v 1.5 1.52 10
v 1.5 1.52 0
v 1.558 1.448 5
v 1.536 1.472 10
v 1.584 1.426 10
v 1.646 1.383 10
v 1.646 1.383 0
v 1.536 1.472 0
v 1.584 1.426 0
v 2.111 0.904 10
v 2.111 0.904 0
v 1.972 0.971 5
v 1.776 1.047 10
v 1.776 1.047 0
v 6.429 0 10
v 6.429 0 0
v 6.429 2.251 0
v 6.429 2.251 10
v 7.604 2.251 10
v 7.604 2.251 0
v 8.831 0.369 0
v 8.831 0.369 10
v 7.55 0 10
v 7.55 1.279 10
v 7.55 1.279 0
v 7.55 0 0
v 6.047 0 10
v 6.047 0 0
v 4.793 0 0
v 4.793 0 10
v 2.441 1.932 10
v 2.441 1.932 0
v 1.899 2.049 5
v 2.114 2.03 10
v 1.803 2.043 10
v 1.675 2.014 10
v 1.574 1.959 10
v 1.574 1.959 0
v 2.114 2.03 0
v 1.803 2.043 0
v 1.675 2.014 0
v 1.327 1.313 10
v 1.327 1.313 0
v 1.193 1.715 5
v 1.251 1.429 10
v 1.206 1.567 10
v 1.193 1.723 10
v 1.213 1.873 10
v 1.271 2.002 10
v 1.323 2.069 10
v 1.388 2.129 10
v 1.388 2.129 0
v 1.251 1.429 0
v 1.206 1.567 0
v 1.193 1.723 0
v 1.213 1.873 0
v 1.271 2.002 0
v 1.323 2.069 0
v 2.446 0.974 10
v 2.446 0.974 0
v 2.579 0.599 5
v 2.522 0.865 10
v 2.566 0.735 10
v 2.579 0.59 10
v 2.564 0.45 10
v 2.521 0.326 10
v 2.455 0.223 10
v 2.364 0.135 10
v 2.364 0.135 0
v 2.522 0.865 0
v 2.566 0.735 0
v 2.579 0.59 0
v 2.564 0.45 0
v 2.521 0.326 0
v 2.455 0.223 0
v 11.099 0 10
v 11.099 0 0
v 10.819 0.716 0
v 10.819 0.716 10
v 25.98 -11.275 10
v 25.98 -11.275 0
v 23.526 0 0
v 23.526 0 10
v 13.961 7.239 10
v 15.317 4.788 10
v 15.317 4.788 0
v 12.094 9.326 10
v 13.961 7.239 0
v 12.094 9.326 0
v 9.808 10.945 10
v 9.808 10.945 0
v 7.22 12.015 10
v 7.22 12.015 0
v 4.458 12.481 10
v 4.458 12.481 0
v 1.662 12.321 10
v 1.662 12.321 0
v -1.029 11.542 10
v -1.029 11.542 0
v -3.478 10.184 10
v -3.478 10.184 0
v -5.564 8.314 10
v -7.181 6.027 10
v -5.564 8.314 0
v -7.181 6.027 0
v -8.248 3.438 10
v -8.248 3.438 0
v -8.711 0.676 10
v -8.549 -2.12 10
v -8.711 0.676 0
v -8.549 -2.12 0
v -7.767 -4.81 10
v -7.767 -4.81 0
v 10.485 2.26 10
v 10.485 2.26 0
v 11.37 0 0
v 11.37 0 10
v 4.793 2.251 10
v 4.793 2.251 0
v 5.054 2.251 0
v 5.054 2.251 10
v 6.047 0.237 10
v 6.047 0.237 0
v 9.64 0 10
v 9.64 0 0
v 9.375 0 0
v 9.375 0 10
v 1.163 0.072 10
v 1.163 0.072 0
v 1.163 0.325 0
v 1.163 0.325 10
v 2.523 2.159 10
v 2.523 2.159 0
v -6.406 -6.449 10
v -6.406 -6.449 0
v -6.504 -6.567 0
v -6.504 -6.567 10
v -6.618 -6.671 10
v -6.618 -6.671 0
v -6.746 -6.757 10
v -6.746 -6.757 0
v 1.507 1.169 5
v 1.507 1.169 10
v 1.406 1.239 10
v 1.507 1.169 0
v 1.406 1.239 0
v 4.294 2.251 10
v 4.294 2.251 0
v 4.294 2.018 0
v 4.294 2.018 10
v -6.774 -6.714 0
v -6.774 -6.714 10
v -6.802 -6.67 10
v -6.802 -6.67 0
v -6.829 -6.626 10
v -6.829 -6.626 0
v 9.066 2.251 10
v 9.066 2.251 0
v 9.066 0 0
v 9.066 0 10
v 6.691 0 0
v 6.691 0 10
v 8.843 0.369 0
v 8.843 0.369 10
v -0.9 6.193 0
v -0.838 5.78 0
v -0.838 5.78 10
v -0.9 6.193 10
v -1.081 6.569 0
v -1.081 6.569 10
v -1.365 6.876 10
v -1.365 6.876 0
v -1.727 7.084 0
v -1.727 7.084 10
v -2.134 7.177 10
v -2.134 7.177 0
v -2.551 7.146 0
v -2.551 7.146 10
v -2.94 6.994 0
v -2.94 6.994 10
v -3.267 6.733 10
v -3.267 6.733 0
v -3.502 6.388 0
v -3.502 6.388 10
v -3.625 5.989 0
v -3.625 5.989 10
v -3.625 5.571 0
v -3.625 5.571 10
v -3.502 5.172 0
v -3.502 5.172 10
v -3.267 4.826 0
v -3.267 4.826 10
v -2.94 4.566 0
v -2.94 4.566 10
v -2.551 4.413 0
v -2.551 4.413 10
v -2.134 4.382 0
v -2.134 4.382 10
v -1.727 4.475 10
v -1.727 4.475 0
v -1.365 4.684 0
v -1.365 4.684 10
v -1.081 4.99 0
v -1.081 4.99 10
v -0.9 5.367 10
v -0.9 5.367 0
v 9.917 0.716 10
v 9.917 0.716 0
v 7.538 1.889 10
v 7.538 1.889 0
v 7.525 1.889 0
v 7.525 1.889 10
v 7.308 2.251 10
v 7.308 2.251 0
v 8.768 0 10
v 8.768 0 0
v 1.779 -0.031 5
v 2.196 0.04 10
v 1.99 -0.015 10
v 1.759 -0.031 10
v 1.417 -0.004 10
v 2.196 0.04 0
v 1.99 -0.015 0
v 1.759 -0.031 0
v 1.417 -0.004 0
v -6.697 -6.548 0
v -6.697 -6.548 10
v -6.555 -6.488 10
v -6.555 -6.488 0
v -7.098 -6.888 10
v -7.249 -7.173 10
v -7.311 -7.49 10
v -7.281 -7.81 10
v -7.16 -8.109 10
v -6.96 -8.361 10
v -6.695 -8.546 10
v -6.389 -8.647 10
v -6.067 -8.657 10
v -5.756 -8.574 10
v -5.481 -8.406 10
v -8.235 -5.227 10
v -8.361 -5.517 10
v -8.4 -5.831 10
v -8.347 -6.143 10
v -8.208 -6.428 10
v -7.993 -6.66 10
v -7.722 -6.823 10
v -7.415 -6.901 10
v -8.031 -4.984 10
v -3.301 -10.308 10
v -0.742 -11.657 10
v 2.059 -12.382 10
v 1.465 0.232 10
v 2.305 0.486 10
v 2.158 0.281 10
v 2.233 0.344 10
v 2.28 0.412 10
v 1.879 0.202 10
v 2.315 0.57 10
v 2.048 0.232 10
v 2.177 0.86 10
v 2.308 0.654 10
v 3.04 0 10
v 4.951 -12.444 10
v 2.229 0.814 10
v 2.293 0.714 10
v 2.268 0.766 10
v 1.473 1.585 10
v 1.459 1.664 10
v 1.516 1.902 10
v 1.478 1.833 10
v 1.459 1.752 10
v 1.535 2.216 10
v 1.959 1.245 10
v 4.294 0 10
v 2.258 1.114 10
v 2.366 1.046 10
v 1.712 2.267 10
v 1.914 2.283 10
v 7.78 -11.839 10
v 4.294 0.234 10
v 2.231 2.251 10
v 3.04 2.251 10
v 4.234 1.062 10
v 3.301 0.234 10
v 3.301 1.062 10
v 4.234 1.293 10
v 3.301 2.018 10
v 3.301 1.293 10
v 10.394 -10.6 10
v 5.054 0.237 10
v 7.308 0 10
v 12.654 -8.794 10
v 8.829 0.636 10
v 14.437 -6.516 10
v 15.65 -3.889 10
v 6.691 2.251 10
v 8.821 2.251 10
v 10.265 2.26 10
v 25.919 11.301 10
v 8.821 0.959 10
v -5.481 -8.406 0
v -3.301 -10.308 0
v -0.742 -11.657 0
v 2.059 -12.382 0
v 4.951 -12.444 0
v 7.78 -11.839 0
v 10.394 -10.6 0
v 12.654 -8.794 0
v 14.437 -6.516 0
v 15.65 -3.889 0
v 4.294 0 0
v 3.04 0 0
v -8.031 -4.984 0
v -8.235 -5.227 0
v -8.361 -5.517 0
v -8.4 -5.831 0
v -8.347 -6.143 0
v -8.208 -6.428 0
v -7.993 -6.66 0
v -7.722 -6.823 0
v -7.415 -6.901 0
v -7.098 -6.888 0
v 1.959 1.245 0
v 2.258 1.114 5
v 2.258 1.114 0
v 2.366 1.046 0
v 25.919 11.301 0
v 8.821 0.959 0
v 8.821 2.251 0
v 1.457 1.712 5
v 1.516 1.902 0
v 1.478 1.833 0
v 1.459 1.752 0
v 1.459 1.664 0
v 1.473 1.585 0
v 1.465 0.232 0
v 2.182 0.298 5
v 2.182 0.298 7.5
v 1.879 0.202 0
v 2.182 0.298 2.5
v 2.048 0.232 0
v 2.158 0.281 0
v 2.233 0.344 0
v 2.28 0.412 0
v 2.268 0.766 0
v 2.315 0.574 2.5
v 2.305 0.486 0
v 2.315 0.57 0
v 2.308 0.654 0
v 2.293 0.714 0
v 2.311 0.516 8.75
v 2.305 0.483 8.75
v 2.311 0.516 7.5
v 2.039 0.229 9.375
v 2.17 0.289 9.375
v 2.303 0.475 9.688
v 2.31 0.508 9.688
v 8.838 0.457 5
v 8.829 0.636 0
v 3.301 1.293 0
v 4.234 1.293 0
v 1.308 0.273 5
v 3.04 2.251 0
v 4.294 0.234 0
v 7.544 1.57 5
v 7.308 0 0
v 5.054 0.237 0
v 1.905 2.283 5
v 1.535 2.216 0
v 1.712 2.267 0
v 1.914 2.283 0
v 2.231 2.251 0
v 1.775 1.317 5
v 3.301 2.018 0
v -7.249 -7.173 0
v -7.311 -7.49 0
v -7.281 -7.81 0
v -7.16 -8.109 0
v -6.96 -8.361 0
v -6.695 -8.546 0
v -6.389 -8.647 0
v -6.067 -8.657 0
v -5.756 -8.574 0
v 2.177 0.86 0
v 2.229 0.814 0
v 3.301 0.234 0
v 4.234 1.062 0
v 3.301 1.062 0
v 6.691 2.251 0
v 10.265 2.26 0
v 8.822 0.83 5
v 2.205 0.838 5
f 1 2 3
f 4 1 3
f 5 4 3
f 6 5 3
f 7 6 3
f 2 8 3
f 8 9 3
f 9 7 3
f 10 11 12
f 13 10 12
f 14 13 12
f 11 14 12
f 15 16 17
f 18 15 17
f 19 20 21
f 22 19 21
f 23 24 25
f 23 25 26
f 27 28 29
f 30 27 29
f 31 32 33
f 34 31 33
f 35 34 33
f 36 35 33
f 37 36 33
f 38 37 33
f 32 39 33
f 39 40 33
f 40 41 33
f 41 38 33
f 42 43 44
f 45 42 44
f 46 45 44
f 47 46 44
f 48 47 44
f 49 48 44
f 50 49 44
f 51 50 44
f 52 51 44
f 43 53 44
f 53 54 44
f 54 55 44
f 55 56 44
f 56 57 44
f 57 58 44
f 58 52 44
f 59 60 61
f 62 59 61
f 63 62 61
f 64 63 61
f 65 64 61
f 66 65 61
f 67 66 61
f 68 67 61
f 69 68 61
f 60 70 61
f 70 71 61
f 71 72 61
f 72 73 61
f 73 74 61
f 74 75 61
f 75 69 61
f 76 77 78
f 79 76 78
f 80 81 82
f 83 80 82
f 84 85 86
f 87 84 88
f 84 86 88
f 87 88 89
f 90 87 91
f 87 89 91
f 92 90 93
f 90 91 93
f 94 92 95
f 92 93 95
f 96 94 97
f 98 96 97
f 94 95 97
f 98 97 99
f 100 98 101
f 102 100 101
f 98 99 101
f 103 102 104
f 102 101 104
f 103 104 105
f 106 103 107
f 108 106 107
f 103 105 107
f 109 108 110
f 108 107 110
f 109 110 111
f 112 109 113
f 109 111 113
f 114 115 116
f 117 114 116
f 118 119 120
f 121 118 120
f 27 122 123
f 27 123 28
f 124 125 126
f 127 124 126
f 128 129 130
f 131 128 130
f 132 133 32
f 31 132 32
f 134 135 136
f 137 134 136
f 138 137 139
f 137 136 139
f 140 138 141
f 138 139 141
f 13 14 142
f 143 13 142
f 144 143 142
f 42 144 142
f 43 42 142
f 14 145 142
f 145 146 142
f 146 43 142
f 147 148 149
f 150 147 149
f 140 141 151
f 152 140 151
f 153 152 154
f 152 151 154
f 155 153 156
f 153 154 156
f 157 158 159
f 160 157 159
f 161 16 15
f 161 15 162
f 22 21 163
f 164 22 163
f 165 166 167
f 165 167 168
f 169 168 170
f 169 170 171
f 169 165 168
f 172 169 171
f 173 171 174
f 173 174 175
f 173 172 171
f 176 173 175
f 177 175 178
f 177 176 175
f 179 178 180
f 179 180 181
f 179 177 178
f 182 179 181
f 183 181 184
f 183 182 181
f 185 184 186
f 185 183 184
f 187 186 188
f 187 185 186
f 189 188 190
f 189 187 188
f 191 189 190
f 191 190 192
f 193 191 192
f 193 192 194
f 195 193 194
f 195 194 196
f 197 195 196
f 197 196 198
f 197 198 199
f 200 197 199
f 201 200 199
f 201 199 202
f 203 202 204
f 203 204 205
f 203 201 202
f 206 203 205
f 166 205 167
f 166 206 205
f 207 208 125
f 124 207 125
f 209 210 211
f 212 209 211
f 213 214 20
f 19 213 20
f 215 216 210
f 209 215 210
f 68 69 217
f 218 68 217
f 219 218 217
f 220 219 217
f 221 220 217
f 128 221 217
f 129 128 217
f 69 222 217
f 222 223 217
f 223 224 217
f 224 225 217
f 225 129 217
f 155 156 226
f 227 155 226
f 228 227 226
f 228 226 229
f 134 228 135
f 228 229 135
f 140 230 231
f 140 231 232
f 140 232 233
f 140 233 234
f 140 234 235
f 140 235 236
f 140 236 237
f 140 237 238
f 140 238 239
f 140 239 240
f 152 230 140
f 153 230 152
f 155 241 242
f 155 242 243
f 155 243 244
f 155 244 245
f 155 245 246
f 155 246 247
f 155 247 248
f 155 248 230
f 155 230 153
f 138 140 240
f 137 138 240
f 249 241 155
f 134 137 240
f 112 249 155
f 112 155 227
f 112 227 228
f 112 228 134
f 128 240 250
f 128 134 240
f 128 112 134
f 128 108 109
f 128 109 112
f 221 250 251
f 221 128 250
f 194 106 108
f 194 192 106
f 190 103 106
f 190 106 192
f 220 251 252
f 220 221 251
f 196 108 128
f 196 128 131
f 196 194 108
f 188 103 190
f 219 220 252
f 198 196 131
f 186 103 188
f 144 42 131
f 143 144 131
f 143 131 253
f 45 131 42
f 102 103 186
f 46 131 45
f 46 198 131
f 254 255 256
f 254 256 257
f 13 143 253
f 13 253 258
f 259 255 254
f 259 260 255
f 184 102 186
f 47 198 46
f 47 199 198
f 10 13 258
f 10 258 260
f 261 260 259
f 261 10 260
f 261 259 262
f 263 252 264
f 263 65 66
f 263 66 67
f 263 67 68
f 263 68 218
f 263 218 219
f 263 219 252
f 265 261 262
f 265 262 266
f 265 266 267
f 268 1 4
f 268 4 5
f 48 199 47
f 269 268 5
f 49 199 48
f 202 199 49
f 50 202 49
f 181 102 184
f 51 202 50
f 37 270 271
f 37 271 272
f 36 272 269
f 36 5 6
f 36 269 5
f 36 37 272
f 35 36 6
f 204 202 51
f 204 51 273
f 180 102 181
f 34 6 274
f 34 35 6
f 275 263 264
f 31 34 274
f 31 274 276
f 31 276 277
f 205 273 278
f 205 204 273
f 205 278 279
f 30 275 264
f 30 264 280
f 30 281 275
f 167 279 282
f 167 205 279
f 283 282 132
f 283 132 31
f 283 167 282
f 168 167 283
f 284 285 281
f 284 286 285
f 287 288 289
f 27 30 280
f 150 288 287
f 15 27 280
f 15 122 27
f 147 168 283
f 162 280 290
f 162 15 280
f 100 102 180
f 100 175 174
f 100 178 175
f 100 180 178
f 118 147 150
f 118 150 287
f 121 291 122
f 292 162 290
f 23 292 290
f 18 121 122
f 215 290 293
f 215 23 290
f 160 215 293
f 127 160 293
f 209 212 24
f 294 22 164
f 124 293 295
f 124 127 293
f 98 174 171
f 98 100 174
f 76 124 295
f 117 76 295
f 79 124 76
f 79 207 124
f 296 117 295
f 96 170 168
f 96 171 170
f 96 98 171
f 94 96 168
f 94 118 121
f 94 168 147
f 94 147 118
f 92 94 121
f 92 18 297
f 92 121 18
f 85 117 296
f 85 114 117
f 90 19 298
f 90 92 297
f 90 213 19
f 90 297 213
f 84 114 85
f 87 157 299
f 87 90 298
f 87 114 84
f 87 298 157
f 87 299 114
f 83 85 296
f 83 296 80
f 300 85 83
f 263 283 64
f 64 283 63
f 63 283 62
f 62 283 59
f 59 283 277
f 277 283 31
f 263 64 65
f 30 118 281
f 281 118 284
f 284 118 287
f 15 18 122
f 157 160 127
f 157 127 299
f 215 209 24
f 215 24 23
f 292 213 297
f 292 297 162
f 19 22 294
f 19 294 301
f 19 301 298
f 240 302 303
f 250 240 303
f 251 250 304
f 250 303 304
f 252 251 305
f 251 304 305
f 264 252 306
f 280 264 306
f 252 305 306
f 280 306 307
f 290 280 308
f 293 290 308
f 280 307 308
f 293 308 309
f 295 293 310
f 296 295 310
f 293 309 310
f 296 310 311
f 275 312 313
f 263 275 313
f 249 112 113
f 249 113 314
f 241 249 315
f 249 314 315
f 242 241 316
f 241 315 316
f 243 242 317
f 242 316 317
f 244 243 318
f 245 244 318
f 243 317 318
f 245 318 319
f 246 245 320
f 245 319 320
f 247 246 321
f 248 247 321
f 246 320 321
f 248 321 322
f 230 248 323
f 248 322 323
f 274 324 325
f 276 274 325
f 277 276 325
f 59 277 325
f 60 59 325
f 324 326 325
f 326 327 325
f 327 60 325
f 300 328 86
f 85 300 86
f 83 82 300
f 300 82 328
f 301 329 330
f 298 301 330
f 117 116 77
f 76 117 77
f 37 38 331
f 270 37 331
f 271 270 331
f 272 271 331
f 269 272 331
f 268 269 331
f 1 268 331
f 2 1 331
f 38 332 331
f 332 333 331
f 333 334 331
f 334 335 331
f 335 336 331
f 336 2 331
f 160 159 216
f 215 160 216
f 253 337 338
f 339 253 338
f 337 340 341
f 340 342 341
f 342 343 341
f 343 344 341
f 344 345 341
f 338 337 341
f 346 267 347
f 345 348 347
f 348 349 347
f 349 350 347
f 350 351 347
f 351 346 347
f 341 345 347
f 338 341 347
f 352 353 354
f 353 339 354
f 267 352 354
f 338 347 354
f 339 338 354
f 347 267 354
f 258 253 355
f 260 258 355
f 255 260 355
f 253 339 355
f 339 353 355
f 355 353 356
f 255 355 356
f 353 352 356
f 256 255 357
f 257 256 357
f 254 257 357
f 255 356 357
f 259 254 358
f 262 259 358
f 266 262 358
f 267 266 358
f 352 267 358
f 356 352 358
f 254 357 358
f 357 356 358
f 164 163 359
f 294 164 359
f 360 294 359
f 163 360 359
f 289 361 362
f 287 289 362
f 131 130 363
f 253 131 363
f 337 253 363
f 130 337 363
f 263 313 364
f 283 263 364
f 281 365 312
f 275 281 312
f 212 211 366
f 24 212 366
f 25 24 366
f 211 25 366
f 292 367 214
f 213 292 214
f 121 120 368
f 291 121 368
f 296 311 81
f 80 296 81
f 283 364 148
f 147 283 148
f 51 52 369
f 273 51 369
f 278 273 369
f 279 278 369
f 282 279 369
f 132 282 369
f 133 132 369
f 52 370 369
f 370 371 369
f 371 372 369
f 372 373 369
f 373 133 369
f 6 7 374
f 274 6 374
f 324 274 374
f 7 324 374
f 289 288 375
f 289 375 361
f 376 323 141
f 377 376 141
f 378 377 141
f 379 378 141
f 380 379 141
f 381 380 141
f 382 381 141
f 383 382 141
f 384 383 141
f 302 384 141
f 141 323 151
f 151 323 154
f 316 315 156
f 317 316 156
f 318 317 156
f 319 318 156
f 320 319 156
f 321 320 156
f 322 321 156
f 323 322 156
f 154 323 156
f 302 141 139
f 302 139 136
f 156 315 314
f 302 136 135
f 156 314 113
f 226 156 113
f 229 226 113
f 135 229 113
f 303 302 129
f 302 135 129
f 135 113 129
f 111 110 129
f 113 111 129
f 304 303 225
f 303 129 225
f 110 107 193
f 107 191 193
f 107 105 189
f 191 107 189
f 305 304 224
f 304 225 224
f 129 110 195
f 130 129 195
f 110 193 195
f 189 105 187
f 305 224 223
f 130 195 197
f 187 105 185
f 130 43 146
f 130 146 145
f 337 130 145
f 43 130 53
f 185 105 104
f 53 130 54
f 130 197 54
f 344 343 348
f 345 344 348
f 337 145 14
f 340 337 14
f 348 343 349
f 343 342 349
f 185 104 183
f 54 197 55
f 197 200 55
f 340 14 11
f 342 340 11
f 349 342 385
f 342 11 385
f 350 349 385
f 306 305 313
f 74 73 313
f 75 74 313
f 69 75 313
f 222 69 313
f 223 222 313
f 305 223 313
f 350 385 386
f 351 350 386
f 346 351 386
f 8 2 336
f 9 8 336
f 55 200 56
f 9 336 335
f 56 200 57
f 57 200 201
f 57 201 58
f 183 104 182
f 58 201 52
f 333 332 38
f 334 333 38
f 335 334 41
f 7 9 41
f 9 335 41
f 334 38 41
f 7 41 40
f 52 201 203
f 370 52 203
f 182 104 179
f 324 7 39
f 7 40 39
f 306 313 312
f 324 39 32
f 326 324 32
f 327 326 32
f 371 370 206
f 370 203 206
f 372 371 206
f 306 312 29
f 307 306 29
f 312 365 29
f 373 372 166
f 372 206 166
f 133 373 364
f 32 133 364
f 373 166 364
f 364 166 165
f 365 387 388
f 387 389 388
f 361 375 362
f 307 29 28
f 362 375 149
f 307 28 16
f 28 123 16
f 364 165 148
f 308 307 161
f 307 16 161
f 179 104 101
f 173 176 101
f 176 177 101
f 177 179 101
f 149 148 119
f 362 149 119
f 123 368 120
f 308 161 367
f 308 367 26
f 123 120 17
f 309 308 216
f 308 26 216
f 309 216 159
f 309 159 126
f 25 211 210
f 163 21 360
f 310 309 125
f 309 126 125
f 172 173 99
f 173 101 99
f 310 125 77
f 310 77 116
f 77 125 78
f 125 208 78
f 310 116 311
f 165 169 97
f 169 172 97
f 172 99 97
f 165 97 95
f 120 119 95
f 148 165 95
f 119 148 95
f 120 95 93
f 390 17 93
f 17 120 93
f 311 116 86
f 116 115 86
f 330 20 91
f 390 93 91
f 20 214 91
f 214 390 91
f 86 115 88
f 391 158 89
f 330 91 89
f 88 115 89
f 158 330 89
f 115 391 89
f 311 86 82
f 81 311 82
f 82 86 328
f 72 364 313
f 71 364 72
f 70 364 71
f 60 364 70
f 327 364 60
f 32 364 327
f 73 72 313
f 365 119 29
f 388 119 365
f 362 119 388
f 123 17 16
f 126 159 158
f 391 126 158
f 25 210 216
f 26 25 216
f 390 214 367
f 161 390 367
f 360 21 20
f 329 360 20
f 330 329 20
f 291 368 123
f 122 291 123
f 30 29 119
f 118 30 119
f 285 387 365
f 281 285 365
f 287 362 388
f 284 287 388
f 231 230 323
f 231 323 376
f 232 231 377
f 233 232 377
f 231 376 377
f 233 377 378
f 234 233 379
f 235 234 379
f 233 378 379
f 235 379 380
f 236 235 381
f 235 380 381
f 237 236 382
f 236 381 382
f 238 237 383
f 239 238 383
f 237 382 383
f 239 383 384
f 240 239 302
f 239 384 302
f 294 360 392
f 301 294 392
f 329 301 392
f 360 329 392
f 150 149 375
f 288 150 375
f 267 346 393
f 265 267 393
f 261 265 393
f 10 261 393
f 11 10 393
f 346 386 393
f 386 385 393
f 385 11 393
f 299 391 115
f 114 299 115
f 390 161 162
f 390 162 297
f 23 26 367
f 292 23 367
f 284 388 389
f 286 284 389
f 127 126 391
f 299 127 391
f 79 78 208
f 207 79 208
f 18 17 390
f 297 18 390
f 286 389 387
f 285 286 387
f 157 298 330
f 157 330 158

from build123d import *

# Parameters (mm, degrees)
F0_R     = 1.4016050998
F0_W     = 0.2615615931
F0_H     = 2.2506119
F1_DEPTH = 10


with BuildPart() as f1:
    # F0 (on Top) → F1 (new body)
    with BuildSketch(Plane.XY):
        with BuildLine():
            ThreePointArc((15.6497281832, -3.8894937424), (16.1141499311, -1.9693410977), (16.2702568807, 0))
            ThreePointArc((16.2702568807, 0), (16.0296169984, 2.440919807), (15.31696256, 4.7878583893))
            ThreePointArc((15.31696256, 4.7878583893), (-1.0286524493, 11.5421171906), (-7.7672612448, -4.8099558734))
            ThreePointArc((-7.7672612448, -4.8099558734), (-6.7093134723, -4.877150661), (-6.1988012008, -5.8062070906))
            ThreePointArc((-6.1988012008, -5.8062070906), (-6.2518108787, -6.1436650731), (-6.4057336913, -6.4486170097))
            ThreePointArc((-6.4057336913, -6.4486170097), (-5.4828783131, -6.684585858), (-5.0770177625, -7.5463402081))
            ThreePointArc((-5.0770177625, -7.5463402081), (-5.1829933682, -8.0214071787), (-5.4808256952, -8.4063946597))
            ThreePointArc((-5.4808256952, -8.4063946597), (6.3832446914, -12.2238412417), (15.6497281832, -3.8894937424))
        make_face()
        with Locations((-2.2391737439, 5.7797180489)):
            Circle(F0_R, mode=Mode.SUBTRACT)
        with BuildLine():
            add(Edge.make_bspline(
                [(2.4462237992, 0.9743292489), (2.5792212194, 0.8295098358), (2.5792212194, 0.598980974)],
                knots=[0, 0, 0, 1, 1, 1], degree=2))
            add(Edge.make_bspline(
                [(2.5792212194, 0.598980974), (2.5792212194, 0.3019534022), (2.3637161403, 0.1354603354)],
                knots=[0, 0, 0, 1, 1, 1], degree=2))
            add(Edge.make_bspline(
                [(2.3637161403, 0.1354603354), (2.1482110613, -0.0310327314), (1.7787737829, -0.0310327314)],
                knots=[0, 0, 0, 1, 1, 1], degree=2))
            add(Edge.make_bspline(
                [(1.7787737829, -0.0310327314), (1.3787963561, -0.0310327314), (1.1630449855, 0.0724097066)],
                knots=[0, 0, 0, 1, 1, 1], degree=2))
            Line((1.1630449855, 0.0724097066), (1.1630449855, 0.324612222))
            add(Edge.make_bspline(
                [(1.1630449855, 0.324612222), (1.3019534022, 0.2664874235), (1.4649983877, 0.2324991939)],
                knots=[0, 0, 0, 1, 1, 1], degree=2))
            add(Edge.make_bspline(
                [(1.4649983877, 0.2324991939), (1.6280433733, 0.1985109643), (1.7881328606, 0.1985109643)],
                knots=[0, 0, 0, 1, 1, 1], degree=2))
            add(Edge.make_bspline(
                [(1.7881328606, 0.1985109643), (2.0496944537, 0.1985109643), (2.1821992909, 0.2977664464)],
                knots=[0, 0, 0, 1, 1, 1], degree=2))
            add(Edge.make_bspline(
                [(2.1821992909, 0.2977664464), (2.3147041281, 0.3970219285), (2.3147041281, 0.5743518222)],
                knots=[0, 0, 0, 1, 1, 1], degree=2))
            add(Edge.make_bspline(
                [(2.3147041281, 0.5743518222), (2.3147041281, 0.6910940021), (2.2676624479, 0.7657203324)],
                knots=[0, 0, 0, 1, 1, 1], degree=2))
            add(Edge.make_bspline(
                [(2.2676624479, 0.7657203324), (2.2206207678, 0.8403466626), (2.1105284589, 0.903643583)],
                knots=[0, 0, 0, 1, 1, 1], degree=2))
            add(Edge.make_bspline(
                [(2.1105284589, 0.903643583), (2.0004361499, 0.9669405033), (1.7758182846, 1.0467389555)],
                knots=[0, 0, 0, 1, 1, 1], degree=2))
            add(Edge.make_bspline(
                [(1.7758182846, 1.0467389555), (1.4620428895, 1.1590478881), (1.3273214287, 1.3129800874)],
                knots=[0, 0, 0, 1, 1, 1], degree=2))
            add(Edge.make_bspline(
                [(1.3273214287, 1.3129800874), (1.1925999678, 1.4669122868), (1.1925999678, 1.7146815548)],
                knots=[0, 0, 0, 1, 1, 1], degree=2))
            add(Edge.make_bspline(
                [(1.1925999678, 1.7146815548), (1.1925999678, 1.9747653988), (1.3879091423, 2.1286975981)],
                knots=[0, 0, 0, 1, 1, 1], degree=2))
            add(Edge.make_bspline(
                [(1.3879091423, 2.1286975981), (1.5832183168, 2.2826297975), (1.9053676236, 2.2826297975)],
                knots=[0, 0, 0, 1, 1, 1], degree=2))
            add(Edge.make_bspline(
                [(1.9053676236, 2.2826297975), (2.2408166724, 2.2826297975), (2.52257417, 2.159484038)],
                knots=[0, 0, 0, 1, 1, 1], degree=2))
            Line((2.52257417, 2.159484038), (2.4408053858, 1.9319106745))
            add(Edge.make_bspline(
                [(2.4408053858, 1.9319106745), (2.1620033863, 2.0486528545), (1.8989640441, 2.0486528545)],
                knots=[0, 0, 0, 1, 1, 1], degree=2))
            add(Edge.make_bspline(
                [(1.8989640441, 2.0486528545), (1.6910940021, 2.0486528545), (1.5741055306, 1.9594953246)],
                knots=[0, 0, 0, 1, 1, 1], degree=2))
            add(Edge.make_bspline(
                [(1.5741055306, 1.9594953246), (1.4571170591, 1.8703377948), (1.4571170591, 1.7117260566)],
                knots=[0, 0, 0, 1, 1, 1], degree=2))
            add(Edge.make_bspline(
                [(1.4571170591, 1.7117260566), (1.4571170591, 1.5949838766), (1.500218075, 1.5201112549)],
                knots=[0, 0, 0, 1, 1, 1], degree=2))
            add(Edge.make_bspline(
                [(1.500218075, 1.5201112549), (1.5433190908, 1.4452386331), (1.6457763626, 1.3829268788)],
                knots=[0, 0, 0, 1, 1, 1], degree=2))
            add(Edge.make_bspline(
                [(1.6457763626, 1.3829268788), (1.7482336345, 1.3206151245), (1.9590591747, 1.2452499197)],
                knots=[0, 0, 0, 1, 1, 1], degree=2))
            add(Edge.make_bspline(
                [(1.9590591747, 1.2452499197), (2.3132263789, 1.119148662), (2.4462237992, 0.9743292489)],
                knots=[0, 0, 0, 1, 1, 1], degree=2))
        make_face(mode=Mode.SUBTRACT)
        Polygon((4.2943953572, 0.233976943), (4.2943953572, 0), (3.0397863598, 0), (3.0397863598, 2.2506119), (4.2943953572, 2.2506119), (4.2943953572, 2.0181127061), (3.3013479529, 2.0181127061), (3.3013479529, 1.2930304744), (4.2343002266, 1.2930304744), (4.2343002266, 1.0620090296), (3.3013479529, 1.0620090296), (3.3013479529, 0.233976943), align=None, mode=Mode.SUBTRACT)
        Polygon((6.047498389, 0), (4.7928893916, 0), (4.7928893916, 2.2506119), (5.0544509847, 2.2506119), (5.0544509847, 0.2369324412), (6.047498389, 0.2369324412), align=None, mode=Mode.SUBTRACT)
        with Locations((6.5600310399, 1.12530595)):
            Rectangle(F0_W, F0_H, mode=Mode.SUBTRACT)
        with BuildLine():
            Line((9.066047245, 2.2506119), (9.066047245, 0))
            Line((9.066047245, 0), (8.7675419241, 0))
            Line((8.7675419241, 0), (7.5375620785, 1.8885633672))
            Line((7.5375620785, 1.8885633672), (7.5252475026, 1.8885633672))
            add(Edge.make_bspline(
                [(7.5252475026, 1.8885633672), (7.5498766545, 1.5560698166), (7.5498766545, 1.2792381493)],
                knots=[0, 0, 0, 1, 1, 1], degree=2))
            Line((7.5498766545, 1.2792381493), (7.5498766545, 0))
            Line((7.5498766545, 0), (7.3080183829, 0))
            Line((7.3080183829, 0), (7.3080183829, 2.2506119))
            Line((7.3080183829, 2.2506119), (7.6035682056, 2.2506119))
            Line((7.6035682056, 2.2506119), (8.8305925529, 0.3694372784))
            Line((8.8305925529, 0.3694372784), (8.8429071289, 0.3694372784))
            add(Edge.make_bspline(
                [(8.8429071289, 0.3694372784), (8.8399516307, 0.4108142536), (8.8291148038, 0.6364172849)],
                knots=[0, 0, 0, 1, 1, 1], degree=2))
            add(Edge.make_bspline(
                [(8.8291148038, 0.6364172849), (8.818277977, 0.8620203163), (8.8212334752, 0.9590591747)],
                knots=[0, 0, 0, 1, 1, 1], degree=2))
            Line((8.8212334752, 0.9590591747), (8.8212334752, 2.2506119))
            Line((8.8212334752, 2.2506119), (9.066047245, 2.2506119))
        make_face(mode=Mode.SUBTRACT)
        Polygon((11.3703506962, 0), (11.0994300253, 0), (10.8191502768, 0.715723154), (9.9172307345, 0.715723154), (9.6403990672, 0), (9.3753893928, 0), (10.2649943592, 2.2599709777), (10.4851789771, 2.2599709777), align=None, mode=Mode.SUBTRACT)
        with BuildLine():
            ThreePointArc((15.31696256, 4.7878583893), (16.0296169984, 2.440919807), (16.2702568807, 0))
            ThreePointArc((16.2702568807, 0), (16.1141499311, -1.9693410977), (15.6497281832, -3.8894937424))
            Line((15.6497281832, -3.8894937424), (25.9802397341, -11.2746227533))
            Line((25.9802397341, -11.2746227533), (23.5263779759, 0))
            Line((23.5263779759, 0), (25.9188935161, 11.3009084016))
            Line((25.9188935161, 11.3009084016), (15.31696256, 4.7878583893))
        make_face()
        with BuildLine():
            ThreePointArc((-6.1988012008, -5.8062070906), (-6.7093134723, -4.877150661), (-7.7672612448, -4.8099558734))
            ThreePointArc((-7.7672612448, -4.8099558734), (-7.3353744108, -5.7371555337), (-6.8291260147, -6.6259401022))
            ThreePointArc((-6.8291260147, -6.6259401022), (-6.6266300861, -6.5153112644), (-6.4057336913, -6.4486170097))
            ThreePointArc((-6.4057336913, -6.4486170097), (-6.2518108787, -6.1436650731), (-6.1988012008, -5.8062070906))
        make_face()
        with BuildLine():
            ThreePointArc((-6.8291260147, -6.6259401022), (-7.3353744108, -5.7371555337), (-7.7672612448, -4.8099558734))
            ThreePointArc((-7.7672612448, -4.8099558734), (-8.3471428725, -6.1433715274), (-7.0984216701, -6.8883247926))
            ThreePointArc((-7.0984216701, -6.8883247926), (-6.9748850194, -6.7457286125), (-6.8291260147, -6.6259401022))
        make_face()
        with BuildLine():
            ThreePointArc((-7.0984216701, -6.8883247926), (-6.9597521838, -8.3614224908), (-5.4808256952, -8.4063946597))
            ThreePointArc((-5.4808256952, -8.4063946597), (-6.1476298332, -7.608253619), (-6.7457763686, -6.7574436512))
            ThreePointArc((-6.7457763686, -6.7574436512), (-6.9164663705, -6.8380607946), (-7.0984216701, -6.8883247926))
        make_face()
        with BuildLine():
            ThreePointArc((-6.7457763686, -6.7574436512), (-6.1476298332, -7.608253619), (-5.4808256952, -8.4063946597))
            ThreePointArc((-5.4808256952, -8.4063946597), (-5.1829933682, -8.0214071787), (-5.0770177625, -7.5463402081))
            ThreePointArc((-5.0770177625, -7.5463402081), (-5.4828783131, -6.684585858), (-6.4057336913, -6.4486170097))
            ThreePointArc((-6.4057336913, -6.4486170097), (-6.5594644952, -6.6209675039), (-6.7457763686, -6.7574436512))
        make_face()
        with BuildLine():
            ThreePointArc((-6.7457763686, -6.7574436512), (-6.7876559356, -6.6918216476), (-6.8291260147, -6.6259401022))
            ThreePointArc((-6.8291260147, -6.6259401022), (-6.9748850194, -6.7457286125), (-7.0984216701, -6.8883247926))
            ThreePointArc((-7.0984216701, -6.8883247926), (-6.9164663705, -6.8380607946), (-6.7457763686, -6.7574436512))
        make_face()
    extrude(amount=F1_DEPTH)


solid = f1.part
